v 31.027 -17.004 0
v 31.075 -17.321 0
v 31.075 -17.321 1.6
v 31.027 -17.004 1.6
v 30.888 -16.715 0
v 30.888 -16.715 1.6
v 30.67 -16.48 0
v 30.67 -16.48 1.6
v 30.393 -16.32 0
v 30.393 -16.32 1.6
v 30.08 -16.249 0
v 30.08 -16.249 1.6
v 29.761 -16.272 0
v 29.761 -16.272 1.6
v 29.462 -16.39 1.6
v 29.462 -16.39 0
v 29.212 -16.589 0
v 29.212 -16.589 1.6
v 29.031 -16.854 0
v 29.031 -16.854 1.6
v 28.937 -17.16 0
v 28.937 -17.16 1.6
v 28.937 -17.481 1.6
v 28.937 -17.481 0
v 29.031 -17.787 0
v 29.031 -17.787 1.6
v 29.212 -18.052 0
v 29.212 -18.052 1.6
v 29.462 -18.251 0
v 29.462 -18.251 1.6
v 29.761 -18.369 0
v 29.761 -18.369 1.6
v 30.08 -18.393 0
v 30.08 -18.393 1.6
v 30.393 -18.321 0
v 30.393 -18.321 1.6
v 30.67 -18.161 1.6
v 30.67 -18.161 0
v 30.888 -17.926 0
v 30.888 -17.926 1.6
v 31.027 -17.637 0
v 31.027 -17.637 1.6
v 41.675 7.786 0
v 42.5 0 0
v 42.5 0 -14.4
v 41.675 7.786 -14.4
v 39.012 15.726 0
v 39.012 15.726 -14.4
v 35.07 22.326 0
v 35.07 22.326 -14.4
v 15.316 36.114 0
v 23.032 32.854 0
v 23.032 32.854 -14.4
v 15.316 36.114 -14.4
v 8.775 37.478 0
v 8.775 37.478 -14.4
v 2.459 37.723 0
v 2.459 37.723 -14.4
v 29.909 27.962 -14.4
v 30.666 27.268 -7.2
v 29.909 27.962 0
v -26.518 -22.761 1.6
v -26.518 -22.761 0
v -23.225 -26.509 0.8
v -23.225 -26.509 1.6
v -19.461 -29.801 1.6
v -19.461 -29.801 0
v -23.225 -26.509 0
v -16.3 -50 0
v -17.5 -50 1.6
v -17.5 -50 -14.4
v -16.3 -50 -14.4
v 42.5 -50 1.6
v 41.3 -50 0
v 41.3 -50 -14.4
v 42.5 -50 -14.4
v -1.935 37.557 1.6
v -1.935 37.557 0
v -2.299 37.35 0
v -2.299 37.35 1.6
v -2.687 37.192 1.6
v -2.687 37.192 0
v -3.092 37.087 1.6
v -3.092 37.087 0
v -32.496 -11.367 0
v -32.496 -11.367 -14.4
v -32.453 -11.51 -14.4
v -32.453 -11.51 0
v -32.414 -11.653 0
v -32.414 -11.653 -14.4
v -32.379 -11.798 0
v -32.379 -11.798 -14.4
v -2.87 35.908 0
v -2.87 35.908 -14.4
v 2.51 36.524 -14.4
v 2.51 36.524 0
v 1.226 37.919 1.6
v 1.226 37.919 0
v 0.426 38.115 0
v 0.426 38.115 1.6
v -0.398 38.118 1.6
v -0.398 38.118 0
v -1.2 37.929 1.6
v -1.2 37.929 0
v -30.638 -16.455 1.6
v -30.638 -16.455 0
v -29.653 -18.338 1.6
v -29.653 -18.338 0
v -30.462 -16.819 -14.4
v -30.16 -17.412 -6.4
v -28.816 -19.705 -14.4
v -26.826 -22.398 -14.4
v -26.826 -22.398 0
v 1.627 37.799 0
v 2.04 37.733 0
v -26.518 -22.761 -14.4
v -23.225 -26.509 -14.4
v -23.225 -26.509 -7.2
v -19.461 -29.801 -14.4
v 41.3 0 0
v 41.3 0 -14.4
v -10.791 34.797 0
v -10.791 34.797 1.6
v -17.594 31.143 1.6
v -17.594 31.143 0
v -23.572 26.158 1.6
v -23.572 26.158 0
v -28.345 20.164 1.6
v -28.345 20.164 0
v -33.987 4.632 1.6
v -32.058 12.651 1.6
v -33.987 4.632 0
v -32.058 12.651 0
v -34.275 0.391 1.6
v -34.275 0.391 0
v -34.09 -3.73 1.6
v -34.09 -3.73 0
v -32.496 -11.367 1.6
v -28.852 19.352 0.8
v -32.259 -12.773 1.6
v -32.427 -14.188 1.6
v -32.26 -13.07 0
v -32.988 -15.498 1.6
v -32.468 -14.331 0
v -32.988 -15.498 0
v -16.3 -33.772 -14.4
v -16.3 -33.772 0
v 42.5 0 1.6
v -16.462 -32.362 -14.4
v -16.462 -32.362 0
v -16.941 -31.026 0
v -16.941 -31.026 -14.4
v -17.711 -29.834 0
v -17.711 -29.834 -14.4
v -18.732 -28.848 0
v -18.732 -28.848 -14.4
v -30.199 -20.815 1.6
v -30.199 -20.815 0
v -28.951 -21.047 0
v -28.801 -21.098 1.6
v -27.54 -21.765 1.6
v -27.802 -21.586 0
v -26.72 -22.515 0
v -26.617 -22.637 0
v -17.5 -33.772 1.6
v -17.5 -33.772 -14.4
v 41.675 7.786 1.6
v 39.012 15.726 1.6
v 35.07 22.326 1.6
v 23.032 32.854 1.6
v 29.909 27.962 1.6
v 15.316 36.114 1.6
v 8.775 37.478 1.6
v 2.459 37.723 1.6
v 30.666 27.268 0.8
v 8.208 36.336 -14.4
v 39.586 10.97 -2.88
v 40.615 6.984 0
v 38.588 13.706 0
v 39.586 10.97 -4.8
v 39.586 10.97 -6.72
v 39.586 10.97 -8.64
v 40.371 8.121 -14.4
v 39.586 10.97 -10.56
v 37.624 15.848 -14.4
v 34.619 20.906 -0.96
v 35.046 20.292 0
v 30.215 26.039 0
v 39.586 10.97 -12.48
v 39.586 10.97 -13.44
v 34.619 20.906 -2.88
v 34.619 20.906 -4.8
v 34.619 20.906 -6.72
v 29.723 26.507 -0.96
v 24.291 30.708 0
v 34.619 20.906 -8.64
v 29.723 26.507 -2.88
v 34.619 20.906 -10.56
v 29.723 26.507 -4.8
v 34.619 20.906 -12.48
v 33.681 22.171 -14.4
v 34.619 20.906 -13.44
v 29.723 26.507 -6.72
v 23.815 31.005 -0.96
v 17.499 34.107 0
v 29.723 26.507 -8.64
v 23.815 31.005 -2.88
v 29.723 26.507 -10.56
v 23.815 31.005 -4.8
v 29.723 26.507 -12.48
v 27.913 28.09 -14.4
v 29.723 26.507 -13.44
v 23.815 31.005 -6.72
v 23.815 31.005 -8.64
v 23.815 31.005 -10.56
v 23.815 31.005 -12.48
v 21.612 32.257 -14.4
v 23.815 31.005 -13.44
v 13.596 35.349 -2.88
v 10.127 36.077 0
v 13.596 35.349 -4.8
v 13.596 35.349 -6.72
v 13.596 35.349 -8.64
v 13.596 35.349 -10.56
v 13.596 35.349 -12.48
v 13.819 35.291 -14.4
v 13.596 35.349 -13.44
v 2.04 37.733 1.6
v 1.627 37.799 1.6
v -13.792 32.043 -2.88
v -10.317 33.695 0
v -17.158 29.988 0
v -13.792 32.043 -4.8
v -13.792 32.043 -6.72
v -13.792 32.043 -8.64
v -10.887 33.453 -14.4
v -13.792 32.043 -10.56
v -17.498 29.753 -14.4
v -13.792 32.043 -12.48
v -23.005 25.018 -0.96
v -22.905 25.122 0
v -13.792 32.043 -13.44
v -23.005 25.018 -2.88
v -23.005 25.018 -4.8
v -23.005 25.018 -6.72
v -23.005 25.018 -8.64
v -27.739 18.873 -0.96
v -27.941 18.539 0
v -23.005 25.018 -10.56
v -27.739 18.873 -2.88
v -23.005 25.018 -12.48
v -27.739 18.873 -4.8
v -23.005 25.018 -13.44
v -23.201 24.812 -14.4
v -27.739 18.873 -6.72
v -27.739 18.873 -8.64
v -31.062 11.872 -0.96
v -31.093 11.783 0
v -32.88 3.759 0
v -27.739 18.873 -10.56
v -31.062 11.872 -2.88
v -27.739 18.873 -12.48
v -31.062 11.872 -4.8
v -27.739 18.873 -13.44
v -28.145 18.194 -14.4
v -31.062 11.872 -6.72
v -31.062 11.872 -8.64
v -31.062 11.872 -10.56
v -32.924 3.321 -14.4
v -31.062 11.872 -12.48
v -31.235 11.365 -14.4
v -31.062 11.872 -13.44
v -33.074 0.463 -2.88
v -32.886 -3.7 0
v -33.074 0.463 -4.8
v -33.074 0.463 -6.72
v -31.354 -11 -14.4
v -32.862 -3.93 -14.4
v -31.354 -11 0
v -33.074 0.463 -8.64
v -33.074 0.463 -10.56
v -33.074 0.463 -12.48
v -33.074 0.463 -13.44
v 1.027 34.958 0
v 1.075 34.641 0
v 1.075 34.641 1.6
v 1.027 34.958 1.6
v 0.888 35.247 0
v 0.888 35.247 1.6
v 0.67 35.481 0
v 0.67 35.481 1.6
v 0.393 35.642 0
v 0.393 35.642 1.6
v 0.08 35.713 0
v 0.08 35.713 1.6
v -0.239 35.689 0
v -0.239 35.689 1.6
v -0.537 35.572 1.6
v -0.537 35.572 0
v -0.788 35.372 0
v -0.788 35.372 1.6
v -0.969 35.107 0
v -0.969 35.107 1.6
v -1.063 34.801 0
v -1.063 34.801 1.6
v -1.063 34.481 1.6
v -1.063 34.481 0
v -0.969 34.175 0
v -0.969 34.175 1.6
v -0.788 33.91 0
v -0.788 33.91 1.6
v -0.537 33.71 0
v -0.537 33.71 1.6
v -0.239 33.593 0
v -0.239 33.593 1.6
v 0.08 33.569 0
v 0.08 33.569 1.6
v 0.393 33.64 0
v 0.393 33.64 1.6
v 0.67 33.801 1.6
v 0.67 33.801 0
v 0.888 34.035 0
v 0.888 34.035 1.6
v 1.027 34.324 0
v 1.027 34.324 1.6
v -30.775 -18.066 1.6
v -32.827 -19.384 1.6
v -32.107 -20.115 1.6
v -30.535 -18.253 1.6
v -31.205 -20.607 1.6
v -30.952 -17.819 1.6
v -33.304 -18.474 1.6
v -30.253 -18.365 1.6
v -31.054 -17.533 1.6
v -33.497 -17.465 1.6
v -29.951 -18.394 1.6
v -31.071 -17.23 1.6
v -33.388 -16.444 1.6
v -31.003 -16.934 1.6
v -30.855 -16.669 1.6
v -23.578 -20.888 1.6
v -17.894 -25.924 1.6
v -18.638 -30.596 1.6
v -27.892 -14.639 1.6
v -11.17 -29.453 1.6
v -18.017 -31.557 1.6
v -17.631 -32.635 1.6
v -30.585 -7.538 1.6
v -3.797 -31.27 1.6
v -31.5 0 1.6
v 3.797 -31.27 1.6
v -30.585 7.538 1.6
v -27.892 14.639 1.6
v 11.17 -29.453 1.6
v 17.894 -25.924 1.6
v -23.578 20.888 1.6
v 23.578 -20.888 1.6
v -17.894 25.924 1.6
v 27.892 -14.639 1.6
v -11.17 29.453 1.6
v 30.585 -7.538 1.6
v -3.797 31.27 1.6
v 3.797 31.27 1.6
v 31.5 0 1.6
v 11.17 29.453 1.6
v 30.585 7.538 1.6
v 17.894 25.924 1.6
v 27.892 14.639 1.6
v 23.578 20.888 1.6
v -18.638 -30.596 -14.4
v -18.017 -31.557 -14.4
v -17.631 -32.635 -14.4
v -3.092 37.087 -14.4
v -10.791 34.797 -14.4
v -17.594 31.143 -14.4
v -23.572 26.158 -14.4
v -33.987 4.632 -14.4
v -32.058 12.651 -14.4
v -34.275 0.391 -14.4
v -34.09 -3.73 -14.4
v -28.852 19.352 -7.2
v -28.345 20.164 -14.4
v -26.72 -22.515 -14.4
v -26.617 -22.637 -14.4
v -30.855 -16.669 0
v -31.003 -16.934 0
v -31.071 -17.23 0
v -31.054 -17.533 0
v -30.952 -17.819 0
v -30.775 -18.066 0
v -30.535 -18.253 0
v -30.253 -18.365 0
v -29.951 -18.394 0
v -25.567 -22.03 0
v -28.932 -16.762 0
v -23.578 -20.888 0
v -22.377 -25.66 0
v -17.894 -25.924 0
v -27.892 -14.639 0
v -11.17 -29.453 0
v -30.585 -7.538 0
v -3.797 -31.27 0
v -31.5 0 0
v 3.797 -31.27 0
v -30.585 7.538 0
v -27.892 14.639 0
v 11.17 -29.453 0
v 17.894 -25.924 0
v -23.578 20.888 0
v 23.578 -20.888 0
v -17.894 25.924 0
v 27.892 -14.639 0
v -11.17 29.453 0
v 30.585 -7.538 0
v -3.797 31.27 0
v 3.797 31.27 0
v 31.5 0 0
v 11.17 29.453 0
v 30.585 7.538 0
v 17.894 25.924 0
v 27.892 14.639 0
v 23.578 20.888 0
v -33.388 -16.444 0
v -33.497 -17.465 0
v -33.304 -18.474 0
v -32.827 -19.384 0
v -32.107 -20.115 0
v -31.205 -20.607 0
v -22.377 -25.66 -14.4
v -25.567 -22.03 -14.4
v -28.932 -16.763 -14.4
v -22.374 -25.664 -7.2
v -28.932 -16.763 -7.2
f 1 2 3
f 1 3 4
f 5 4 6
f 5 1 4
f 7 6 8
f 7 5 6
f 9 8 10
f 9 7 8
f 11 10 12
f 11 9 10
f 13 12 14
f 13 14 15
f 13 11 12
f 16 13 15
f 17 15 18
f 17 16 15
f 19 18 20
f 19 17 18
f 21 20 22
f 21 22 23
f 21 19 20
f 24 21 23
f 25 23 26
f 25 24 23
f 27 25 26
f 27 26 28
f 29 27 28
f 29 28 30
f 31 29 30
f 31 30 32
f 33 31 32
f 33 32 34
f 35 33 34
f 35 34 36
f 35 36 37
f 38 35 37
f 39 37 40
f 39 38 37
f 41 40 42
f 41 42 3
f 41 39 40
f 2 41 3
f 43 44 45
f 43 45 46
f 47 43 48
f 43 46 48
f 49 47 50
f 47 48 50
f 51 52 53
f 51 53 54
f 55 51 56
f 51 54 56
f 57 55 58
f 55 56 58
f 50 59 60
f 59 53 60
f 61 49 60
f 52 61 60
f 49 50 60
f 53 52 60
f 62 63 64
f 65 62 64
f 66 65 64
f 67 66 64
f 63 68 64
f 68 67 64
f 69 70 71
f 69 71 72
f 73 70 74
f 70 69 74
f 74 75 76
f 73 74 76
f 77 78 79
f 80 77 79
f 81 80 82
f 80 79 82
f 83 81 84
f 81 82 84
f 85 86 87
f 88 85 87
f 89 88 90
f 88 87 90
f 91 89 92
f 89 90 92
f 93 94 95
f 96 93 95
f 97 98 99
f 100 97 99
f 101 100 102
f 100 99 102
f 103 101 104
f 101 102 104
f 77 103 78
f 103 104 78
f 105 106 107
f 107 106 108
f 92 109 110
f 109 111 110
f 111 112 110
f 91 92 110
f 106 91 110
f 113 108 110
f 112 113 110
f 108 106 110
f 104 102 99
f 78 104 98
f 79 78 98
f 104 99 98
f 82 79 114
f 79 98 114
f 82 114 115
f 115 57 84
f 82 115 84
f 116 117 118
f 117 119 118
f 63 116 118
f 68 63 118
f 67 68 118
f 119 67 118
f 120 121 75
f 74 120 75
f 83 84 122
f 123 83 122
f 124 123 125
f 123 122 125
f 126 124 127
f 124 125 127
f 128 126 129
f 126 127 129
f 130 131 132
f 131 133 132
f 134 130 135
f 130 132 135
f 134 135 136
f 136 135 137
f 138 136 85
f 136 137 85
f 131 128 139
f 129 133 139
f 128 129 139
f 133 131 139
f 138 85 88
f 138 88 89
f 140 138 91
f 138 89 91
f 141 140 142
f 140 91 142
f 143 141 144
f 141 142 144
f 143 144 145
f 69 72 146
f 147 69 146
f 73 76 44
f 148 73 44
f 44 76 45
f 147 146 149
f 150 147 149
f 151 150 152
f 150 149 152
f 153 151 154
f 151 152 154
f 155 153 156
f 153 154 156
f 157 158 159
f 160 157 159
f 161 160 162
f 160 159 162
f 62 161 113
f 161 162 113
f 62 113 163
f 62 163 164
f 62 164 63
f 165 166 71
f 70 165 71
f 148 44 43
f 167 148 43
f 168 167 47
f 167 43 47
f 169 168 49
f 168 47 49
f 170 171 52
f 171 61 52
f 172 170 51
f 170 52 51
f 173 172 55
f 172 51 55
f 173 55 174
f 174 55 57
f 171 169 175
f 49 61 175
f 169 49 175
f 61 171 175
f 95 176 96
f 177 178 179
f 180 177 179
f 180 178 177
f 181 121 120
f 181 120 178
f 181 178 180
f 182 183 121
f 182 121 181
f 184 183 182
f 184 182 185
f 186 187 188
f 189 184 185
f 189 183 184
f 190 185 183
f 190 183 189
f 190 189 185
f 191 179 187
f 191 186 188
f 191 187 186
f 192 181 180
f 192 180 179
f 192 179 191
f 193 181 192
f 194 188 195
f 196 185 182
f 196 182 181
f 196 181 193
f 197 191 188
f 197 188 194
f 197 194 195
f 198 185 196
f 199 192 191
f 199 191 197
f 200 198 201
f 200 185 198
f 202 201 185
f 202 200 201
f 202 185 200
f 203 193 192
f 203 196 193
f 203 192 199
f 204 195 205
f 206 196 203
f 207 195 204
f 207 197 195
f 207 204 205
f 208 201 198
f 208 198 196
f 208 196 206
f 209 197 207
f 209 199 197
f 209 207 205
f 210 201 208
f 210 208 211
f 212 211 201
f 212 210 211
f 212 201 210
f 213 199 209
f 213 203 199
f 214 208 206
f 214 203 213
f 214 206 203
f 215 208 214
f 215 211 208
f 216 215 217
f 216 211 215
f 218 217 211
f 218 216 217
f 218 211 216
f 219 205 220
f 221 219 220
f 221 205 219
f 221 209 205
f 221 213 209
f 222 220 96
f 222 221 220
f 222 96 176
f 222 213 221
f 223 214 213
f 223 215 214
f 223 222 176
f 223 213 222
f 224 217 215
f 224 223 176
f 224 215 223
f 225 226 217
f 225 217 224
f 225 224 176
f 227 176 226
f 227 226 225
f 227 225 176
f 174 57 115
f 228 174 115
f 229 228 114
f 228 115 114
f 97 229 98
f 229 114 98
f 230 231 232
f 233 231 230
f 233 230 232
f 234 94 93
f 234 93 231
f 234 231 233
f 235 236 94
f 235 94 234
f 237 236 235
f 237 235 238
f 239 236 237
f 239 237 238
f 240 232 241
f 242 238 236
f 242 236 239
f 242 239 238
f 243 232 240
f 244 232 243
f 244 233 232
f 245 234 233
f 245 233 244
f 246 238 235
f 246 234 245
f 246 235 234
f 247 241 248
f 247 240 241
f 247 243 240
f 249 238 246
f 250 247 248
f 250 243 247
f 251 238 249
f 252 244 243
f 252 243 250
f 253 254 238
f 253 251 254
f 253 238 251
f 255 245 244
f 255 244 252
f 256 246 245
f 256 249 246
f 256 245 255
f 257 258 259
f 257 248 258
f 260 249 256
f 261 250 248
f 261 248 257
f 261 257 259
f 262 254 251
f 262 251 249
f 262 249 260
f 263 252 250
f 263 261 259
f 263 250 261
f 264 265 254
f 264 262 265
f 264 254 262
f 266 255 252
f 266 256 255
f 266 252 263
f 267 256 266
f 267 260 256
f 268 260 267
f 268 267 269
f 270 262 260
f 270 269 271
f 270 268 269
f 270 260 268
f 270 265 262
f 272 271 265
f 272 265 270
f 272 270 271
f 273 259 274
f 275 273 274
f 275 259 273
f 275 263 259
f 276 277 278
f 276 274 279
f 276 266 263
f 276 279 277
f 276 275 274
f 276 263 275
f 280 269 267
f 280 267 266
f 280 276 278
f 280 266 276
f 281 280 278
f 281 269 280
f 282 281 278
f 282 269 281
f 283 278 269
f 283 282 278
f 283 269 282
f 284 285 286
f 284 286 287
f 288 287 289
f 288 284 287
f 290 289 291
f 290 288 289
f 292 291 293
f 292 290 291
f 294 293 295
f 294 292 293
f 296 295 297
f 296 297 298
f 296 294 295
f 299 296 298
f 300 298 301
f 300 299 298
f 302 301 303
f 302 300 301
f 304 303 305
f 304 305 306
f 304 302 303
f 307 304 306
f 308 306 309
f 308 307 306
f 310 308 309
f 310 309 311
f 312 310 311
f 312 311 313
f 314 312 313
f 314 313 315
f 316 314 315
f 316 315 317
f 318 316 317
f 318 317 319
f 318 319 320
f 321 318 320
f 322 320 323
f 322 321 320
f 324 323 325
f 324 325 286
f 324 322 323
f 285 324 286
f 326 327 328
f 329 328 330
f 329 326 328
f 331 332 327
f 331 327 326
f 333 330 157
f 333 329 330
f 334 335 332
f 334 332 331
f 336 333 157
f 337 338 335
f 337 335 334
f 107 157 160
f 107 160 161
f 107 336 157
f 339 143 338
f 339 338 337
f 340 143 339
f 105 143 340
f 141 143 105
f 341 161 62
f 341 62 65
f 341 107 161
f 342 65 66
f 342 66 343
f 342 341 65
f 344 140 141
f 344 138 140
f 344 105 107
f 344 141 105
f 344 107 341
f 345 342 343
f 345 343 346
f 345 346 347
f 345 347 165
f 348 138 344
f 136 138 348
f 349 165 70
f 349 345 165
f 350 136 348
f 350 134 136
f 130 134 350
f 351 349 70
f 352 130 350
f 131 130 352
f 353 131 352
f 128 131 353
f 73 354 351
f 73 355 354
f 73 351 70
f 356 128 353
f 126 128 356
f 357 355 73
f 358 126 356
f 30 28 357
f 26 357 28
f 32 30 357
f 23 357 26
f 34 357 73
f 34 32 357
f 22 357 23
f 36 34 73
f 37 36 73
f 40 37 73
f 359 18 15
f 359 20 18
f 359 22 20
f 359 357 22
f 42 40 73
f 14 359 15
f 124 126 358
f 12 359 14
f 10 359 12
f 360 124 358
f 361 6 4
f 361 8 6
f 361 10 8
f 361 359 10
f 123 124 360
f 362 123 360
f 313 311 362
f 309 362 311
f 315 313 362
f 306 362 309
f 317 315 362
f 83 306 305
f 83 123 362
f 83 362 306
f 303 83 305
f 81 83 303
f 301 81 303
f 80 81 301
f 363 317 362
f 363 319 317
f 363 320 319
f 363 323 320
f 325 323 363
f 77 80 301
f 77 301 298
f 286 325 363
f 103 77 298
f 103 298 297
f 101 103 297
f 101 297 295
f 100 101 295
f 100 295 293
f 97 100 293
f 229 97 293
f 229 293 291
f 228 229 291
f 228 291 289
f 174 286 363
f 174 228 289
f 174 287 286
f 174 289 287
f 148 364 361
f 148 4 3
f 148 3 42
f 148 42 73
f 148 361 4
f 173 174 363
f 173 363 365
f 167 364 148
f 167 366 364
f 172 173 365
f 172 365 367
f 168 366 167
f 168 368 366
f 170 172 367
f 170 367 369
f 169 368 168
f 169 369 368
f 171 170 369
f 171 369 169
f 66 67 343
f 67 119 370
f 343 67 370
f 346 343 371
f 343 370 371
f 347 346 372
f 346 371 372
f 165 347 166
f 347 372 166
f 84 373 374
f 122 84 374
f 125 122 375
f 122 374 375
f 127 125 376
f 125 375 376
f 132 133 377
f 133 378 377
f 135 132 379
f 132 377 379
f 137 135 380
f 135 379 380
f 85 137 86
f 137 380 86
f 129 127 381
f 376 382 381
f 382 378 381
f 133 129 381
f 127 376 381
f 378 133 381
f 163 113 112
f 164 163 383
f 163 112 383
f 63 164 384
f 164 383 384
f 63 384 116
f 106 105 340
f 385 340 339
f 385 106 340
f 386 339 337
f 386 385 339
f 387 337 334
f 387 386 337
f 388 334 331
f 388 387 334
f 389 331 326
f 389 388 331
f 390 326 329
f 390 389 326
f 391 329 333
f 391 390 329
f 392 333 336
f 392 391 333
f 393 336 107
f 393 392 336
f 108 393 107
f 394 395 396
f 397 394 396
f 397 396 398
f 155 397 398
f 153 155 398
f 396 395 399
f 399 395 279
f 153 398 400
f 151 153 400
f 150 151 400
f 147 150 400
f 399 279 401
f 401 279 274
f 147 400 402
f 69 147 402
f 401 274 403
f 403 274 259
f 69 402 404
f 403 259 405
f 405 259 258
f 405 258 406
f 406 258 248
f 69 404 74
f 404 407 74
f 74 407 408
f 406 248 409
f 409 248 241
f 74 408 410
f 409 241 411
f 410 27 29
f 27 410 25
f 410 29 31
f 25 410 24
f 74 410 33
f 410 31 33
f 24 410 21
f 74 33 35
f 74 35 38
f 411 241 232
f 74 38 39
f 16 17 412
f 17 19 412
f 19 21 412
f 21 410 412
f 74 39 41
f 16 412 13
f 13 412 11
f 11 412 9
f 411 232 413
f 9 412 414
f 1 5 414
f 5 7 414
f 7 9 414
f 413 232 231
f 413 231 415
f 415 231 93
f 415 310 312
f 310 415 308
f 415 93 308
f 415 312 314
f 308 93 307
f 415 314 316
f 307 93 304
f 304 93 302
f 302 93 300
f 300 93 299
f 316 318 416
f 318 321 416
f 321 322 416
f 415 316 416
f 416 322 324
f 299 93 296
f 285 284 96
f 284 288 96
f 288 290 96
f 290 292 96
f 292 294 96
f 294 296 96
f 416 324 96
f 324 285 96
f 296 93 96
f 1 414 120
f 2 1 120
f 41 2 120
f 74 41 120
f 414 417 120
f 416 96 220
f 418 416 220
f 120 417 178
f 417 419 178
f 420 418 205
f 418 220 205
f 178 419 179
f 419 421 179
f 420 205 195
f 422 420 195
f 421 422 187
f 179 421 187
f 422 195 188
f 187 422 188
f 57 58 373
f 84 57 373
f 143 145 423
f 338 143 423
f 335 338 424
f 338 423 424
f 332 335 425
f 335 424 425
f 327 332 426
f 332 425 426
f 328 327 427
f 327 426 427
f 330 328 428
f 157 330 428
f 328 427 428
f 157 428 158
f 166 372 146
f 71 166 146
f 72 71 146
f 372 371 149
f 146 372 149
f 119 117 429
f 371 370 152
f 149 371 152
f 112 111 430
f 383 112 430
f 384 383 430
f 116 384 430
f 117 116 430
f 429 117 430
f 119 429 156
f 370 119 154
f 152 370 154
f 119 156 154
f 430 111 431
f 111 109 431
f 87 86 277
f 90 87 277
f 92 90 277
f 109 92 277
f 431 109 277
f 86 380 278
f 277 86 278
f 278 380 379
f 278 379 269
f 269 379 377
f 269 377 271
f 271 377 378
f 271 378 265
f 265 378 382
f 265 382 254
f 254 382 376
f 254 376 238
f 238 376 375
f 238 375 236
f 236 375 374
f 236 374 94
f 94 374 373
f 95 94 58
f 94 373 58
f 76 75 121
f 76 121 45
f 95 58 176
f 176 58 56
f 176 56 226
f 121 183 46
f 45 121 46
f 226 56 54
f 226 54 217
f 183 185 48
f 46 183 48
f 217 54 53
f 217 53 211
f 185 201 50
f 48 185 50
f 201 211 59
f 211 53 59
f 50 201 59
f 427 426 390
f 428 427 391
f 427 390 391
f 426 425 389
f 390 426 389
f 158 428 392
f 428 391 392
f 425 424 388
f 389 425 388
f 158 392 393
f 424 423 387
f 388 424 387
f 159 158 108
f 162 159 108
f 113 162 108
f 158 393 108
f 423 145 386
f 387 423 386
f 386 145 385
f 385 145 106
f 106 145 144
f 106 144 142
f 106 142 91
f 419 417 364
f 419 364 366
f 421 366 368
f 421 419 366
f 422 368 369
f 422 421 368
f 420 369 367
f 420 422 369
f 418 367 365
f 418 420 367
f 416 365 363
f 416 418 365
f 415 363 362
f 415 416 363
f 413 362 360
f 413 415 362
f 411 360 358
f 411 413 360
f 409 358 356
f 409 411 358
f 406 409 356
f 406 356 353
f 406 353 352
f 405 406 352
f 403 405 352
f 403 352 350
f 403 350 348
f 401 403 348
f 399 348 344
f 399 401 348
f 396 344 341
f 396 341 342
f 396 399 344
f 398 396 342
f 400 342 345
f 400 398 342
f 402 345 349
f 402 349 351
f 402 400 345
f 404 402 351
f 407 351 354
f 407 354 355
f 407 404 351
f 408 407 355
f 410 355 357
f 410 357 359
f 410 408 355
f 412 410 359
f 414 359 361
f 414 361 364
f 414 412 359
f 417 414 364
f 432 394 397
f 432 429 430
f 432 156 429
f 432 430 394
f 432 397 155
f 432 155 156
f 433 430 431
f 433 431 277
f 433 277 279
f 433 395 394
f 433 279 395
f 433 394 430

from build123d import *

# Parameters (mm, degrees)
SKETCH1_R           = 1.075
SKETCH1_R_2         = 31.5
EXTRUDE_BASE_DEPTH  = 1.6
BOSS_EXTRUDE9_START = -16
BOSS_EXTRUDE9_DEPTH = 16


with BuildPart() as part:
    # Sketch1 → extrude-base (new body)
    with BuildSketch(Plane.XY):
        with BuildLine():
            Line((-17.5, -33.771878401), (-17.5, -50))
            Line((-17.5, -50), (42.5, -50))
            Line((42.5, -50), (42.5, -32.5))
            Line((42.5, -32.5), (42.5, 0))
            add(Edge.make_bspline(
                [(42.5, 0), (42.5, 39.41992847), (2.459020818, 37.72319297)],
                knots=[3.141592654, 3.141592654, 3.141592654, 4.755444864, 4.755444864, 4.755444864], degree=2, weights=[1, 0.691721555, 1]))
            ThreePointArc((2.459020818, 37.72319297), (1.83256577, 37.75937423), (1.22579937, 37.919341562))
            ThreePointArc((1.22579937, 37.919341562), (-0.398220056, 38.118288195), (-1.935215493, 37.5573391))
            ThreePointArc((-1.935215493, 37.5573391), (-2.490054876, 37.26435889), (-3.09205194, 37.087486962))
            add(Edge.make_bspline(
                [(-3.09205194, 37.087486962), (-45.49154498, 29.120596422), (-32.496359083, -11.367088447)],
                knots=[4.901152551, 4.901152551, 4.901152551, 6.588978479, 6.588978479, 6.588978479], degree=2, weights=[1, 0.664543961, 1]))
            ThreePointArc((-32.496359083, -11.367088447), (-32.292210371, -13.486281945), (-32.988235187, -15.498297659))
            ThreePointArc((-32.988235187, -15.498297659), (-33.099394368, -18.946470872), (-30.199142861, -20.814838092))
            ThreePointArc((-30.199142861, -20.814838092), (-28.146562368, -21.386545462), (-26.51838784, -22.760948497))
            add(Edge.make_bspline(
                [(-26.51838784, -22.760948497), (-23.462509142, -26.739328), (-19.46142089, -29.801105555)],
                knots=[0.647016148, 0.647016148, 0.647016148, 0.90960641, 0.90960641, 0.90960641], degree=2, weights=[1, 0.991393169, 1]))
            ThreePointArc((-19.46142089, -29.801105555), (-18.017093825, -31.557481818), (-17.5, -33.771878401))
        make_face()
        with Locations((-30.000000067, -17.320508092)):
            Circle(SKETCH1_R, mode=Mode.SUBTRACT)
        with Locations((29.999999933, -17.320508323)):
            Circle(SKETCH1_R, mode=Mode.SUBTRACT)
        Circle(SKETCH1_R_2, mode=Mode.SUBTRACT)
        with Locations((4.75e-07, 34.641016217)):
            Circle(SKETCH1_R, mode=Mode.SUBTRACT)
    extrude(amount=EXTRUDE_BASE_DEPTH)

    # Sketch10 → Boss-Extrude9 (add)
    with BuildSketch(Plane.XY.offset(1.6).offset(BOSS_EXTRUDE9_START)):
        with BuildLine():
            ThreePointArc((-19.46142089, -29.801105555), (-18.017093825, -31.557481818), (-17.5, -33.771878401))
            Line((-17.5, -33.771878401), (-17.5, -50))
            Line((-17.5, -50), (-16.3, -50))
            Line((-16.3, -50), (-16.3, -33.771878401))
            ThreePointArc((-16.3, -33.771878401), (-16.941196343, -31.026026638), (-18.732161904, -28.848120072))
            add(Edge.make_bspline(
                [(-25.566729106, -22.029958994), (-24.578050638, -23.317097176), (-23.512848671, -24.527527727), (-21.234325104, -26.799912781), (-20.020994759, -27.86185852), (-18.732161904, -28.848120072)],
                knots=[0, 0, 0, 0, 0.5, 0.5, 1, 1, 1, 1], degree=3))
            add(Edge.make_bspline(
                [(-31.353771063, -11.0003561), (-29.402926574, -17.009997513), (-25.566729106, -22.029958994)],
                knots=[0, 0, 0, 1, 1, 1], degree=2))
            add(Edge.make_bspline(
                [(-2.870449298, 35.908126004), (-5.436468745, 35.425969389), (-7.908446803, 34.688998483), (-11.48013295, 33.214275651), (-12.647794485, 32.660650203), (-14.363814313, 31.73409591), (-14.931182069, 31.408323469), (-16.041505892, 30.731515452), (-16.585711755, 30.37989631), (-19.252842137, 28.55678796), (-21.21583927, 26.892395093), (-23.899624838, 24.081338464), (-24.753908137, 23.085995606), (-26.334922562, 21.031961865), (-27.797139019, 18.907327708), (-29.02559046, 16.643769396), (-29.85775681, 14.89310652), (-30.120253088, 14.300701764), (-30.614818965, 13.09780999), (-30.847268804, 12.485965885), (-31.91914351, 9.417171687), (-32.501482258, 6.908170216), (-32.891543237, 3.705654906), (-32.95248376, 3.061803653), (-33.039647527, 1.767292199), (-33.065881554, 1.115023359), (-33.091085507, -0.840788011), (-33.036991084, -2.134381266), (-32.669118059, -5.985347855), (-32.152051166, -8.513241755), (-31.353771063, -11.0003561)],
                knots=[0, 0, 0, 0, 0.125, 0.125, 0.1875, 0.1875, 0.21875, 0.21875, 0.25, 0.25, 0.375, 0.375, 0.4375, 0.4375, 0.5, 0.5625, 0.5625, 0.59375, 0.59375, 0.625, 0.625, 0.75, 0.75, 0.78125, 0.78125, 0.8125, 0.8125, 0.875, 0.875, 1, 1, 1, 1], degree=3))
            Line((-2.870449298, 35.908126004), (2.509825196, 36.524268905))
            add(Edge.make_bspline(
                [(41.3, 0), (41.3, 2.502818734), (41.04130208, 4.961429188), (40.281620587, 8.585837104), (39.96596084, 9.783304118), (39.396449767, 11.56309576), (39.189952319, 12.155110401), (38.748973333, 13.321274183), (38.514247241, 13.896469279), (37.270860158, 16.73380096), (36.055043738, 18.881177517), (33.900747967, 21.919112448), (33.122655894, 22.905459572), (31.485713181, 24.776139158), (30.624910971, 25.664331897), (28.820846522, 27.34887544), (27.877579605, 28.145221035), (26.400572769, 29.270566792), (25.897866794, 29.634131792), (24.87143267, 30.337847815), (24.346202787, 30.678892445), (21.687758086, 32.311479515), (19.463384623, 33.386508759), (15.985995879, 34.665741305), (14.803214467, 35.036173284), (12.992635871, 35.505654836), (12.382473166, 35.647787608), (11.162128702, 35.90033819), (10.550473443, 36.011175912), (7.484880127, 36.489198015), (5.009211723, 36.630180347), (2.509825196, 36.524268905)],
                knots=[0, 0, 0, 0, 0.125, 0.125, 0.1875, 0.1875, 0.21875, 0.21875, 0.25, 0.25, 0.375, 0.375, 0.4375, 0.4375, 0.5, 0.5, 0.5625, 0.5625, 0.59375, 0.59375, 0.625, 0.625, 0.75, 0.75, 0.8125, 0.8125, 0.84375, 0.84375, 0.875, 0.875, 1, 1, 1, 1], degree=3))
            Line((41.3, 0), (41.3, -50))
            Line((41.3, -50), (42.5, -50))
            Line((42.5, -50), (42.5, 0))
            add(Edge.make_bspline(
                [(42.5, 0), (42.5, 7.272816374), (40.709520889, 15.38048571), (36.377186956, 23.35544507), (29.466953178, 29.575937448), (18.075350288, 35.422775935), (14.077470504, 36.812411099), (10.05106521, 37.607236379), (6.150506462, 37.879619583), (2.459020818, 37.72319297)],
                knots=[3.141592654, 3.141592654, 3.141592654, 3.141592654, 3.141592654, 3.141592654, 4.217709058, 4.217709058, 4.217709058, 4.217709058, 4.755444864, 4.755444864, 4.755444864, 4.755444864, 4.755444864, 4.755444864], degree=5, weights=[1, 1, 0.994320542, 0.991840126, 1, 1, 0.999817369, 0.999954298, 1, 1]))
            Line((2.459020818, 37.72319297), (-3.09205194, 37.087486962))
            add(Edge.make_bspline(
                [(-3.09205194, 37.087486962), (-6.72994006, 36.403925571), (-10.480917897, 35.251851793), (-14.244234311, 33.553120472), (-17.846077918, 31.264686538), (-27.980885292, 22.572968302), (-33.523658499, 14.25864054), (-35.587689769, 4.733827824), (-34.835717499, -4.078604305), (-32.496359083, -11.367088447)],
                knots=[4.901152551, 4.901152551, 4.901152551, 4.901152551, 4.901152551, 4.901152551, 5.445946934, 5.445946934, 5.445946934, 5.445946934, 6.588978479, 6.588978479, 6.588978479, 6.588978479, 6.588978479, 6.588978479], degree=5, weights=[1, 1, 1.000006691, 0.999854596, 1, 1, 0.989527804, 0.992928488, 1, 1]))
            ThreePointArc((-32.496359083, -11.367088447), (-32.432859758, -11.58125406), (-32.378989521, -11.79804214))
            add(Edge.make_bspline(
                [(-32.378989521, -11.79804214), (-30.718117642, -17.725309457), (-26.826041177, -22.397628937)],
                knots=[0.033678654, 0.033678654, 0.033678654, 0.963651852, 0.963651852, 0.963651852], degree=2))
            ThreePointArc((-26.826041177, -22.397628937), (-26.667887831, -22.575624954), (-26.51838784, -22.760948497))
            add(Edge.make_bspline(
                [(-26.51838784, -22.760948497), (-23.462509142, -26.739328), (-19.46142089, -29.801105555)],
                knots=[0.647016148, 0.647016148, 0.647016148, 0.90960641, 0.90960641, 0.90960641], degree=2, weights=[1, 0.991393169, 1]))
        make_face()
    extrude(amount=BOSS_EXTRUDE9_DEPTH)


solid = part.part
